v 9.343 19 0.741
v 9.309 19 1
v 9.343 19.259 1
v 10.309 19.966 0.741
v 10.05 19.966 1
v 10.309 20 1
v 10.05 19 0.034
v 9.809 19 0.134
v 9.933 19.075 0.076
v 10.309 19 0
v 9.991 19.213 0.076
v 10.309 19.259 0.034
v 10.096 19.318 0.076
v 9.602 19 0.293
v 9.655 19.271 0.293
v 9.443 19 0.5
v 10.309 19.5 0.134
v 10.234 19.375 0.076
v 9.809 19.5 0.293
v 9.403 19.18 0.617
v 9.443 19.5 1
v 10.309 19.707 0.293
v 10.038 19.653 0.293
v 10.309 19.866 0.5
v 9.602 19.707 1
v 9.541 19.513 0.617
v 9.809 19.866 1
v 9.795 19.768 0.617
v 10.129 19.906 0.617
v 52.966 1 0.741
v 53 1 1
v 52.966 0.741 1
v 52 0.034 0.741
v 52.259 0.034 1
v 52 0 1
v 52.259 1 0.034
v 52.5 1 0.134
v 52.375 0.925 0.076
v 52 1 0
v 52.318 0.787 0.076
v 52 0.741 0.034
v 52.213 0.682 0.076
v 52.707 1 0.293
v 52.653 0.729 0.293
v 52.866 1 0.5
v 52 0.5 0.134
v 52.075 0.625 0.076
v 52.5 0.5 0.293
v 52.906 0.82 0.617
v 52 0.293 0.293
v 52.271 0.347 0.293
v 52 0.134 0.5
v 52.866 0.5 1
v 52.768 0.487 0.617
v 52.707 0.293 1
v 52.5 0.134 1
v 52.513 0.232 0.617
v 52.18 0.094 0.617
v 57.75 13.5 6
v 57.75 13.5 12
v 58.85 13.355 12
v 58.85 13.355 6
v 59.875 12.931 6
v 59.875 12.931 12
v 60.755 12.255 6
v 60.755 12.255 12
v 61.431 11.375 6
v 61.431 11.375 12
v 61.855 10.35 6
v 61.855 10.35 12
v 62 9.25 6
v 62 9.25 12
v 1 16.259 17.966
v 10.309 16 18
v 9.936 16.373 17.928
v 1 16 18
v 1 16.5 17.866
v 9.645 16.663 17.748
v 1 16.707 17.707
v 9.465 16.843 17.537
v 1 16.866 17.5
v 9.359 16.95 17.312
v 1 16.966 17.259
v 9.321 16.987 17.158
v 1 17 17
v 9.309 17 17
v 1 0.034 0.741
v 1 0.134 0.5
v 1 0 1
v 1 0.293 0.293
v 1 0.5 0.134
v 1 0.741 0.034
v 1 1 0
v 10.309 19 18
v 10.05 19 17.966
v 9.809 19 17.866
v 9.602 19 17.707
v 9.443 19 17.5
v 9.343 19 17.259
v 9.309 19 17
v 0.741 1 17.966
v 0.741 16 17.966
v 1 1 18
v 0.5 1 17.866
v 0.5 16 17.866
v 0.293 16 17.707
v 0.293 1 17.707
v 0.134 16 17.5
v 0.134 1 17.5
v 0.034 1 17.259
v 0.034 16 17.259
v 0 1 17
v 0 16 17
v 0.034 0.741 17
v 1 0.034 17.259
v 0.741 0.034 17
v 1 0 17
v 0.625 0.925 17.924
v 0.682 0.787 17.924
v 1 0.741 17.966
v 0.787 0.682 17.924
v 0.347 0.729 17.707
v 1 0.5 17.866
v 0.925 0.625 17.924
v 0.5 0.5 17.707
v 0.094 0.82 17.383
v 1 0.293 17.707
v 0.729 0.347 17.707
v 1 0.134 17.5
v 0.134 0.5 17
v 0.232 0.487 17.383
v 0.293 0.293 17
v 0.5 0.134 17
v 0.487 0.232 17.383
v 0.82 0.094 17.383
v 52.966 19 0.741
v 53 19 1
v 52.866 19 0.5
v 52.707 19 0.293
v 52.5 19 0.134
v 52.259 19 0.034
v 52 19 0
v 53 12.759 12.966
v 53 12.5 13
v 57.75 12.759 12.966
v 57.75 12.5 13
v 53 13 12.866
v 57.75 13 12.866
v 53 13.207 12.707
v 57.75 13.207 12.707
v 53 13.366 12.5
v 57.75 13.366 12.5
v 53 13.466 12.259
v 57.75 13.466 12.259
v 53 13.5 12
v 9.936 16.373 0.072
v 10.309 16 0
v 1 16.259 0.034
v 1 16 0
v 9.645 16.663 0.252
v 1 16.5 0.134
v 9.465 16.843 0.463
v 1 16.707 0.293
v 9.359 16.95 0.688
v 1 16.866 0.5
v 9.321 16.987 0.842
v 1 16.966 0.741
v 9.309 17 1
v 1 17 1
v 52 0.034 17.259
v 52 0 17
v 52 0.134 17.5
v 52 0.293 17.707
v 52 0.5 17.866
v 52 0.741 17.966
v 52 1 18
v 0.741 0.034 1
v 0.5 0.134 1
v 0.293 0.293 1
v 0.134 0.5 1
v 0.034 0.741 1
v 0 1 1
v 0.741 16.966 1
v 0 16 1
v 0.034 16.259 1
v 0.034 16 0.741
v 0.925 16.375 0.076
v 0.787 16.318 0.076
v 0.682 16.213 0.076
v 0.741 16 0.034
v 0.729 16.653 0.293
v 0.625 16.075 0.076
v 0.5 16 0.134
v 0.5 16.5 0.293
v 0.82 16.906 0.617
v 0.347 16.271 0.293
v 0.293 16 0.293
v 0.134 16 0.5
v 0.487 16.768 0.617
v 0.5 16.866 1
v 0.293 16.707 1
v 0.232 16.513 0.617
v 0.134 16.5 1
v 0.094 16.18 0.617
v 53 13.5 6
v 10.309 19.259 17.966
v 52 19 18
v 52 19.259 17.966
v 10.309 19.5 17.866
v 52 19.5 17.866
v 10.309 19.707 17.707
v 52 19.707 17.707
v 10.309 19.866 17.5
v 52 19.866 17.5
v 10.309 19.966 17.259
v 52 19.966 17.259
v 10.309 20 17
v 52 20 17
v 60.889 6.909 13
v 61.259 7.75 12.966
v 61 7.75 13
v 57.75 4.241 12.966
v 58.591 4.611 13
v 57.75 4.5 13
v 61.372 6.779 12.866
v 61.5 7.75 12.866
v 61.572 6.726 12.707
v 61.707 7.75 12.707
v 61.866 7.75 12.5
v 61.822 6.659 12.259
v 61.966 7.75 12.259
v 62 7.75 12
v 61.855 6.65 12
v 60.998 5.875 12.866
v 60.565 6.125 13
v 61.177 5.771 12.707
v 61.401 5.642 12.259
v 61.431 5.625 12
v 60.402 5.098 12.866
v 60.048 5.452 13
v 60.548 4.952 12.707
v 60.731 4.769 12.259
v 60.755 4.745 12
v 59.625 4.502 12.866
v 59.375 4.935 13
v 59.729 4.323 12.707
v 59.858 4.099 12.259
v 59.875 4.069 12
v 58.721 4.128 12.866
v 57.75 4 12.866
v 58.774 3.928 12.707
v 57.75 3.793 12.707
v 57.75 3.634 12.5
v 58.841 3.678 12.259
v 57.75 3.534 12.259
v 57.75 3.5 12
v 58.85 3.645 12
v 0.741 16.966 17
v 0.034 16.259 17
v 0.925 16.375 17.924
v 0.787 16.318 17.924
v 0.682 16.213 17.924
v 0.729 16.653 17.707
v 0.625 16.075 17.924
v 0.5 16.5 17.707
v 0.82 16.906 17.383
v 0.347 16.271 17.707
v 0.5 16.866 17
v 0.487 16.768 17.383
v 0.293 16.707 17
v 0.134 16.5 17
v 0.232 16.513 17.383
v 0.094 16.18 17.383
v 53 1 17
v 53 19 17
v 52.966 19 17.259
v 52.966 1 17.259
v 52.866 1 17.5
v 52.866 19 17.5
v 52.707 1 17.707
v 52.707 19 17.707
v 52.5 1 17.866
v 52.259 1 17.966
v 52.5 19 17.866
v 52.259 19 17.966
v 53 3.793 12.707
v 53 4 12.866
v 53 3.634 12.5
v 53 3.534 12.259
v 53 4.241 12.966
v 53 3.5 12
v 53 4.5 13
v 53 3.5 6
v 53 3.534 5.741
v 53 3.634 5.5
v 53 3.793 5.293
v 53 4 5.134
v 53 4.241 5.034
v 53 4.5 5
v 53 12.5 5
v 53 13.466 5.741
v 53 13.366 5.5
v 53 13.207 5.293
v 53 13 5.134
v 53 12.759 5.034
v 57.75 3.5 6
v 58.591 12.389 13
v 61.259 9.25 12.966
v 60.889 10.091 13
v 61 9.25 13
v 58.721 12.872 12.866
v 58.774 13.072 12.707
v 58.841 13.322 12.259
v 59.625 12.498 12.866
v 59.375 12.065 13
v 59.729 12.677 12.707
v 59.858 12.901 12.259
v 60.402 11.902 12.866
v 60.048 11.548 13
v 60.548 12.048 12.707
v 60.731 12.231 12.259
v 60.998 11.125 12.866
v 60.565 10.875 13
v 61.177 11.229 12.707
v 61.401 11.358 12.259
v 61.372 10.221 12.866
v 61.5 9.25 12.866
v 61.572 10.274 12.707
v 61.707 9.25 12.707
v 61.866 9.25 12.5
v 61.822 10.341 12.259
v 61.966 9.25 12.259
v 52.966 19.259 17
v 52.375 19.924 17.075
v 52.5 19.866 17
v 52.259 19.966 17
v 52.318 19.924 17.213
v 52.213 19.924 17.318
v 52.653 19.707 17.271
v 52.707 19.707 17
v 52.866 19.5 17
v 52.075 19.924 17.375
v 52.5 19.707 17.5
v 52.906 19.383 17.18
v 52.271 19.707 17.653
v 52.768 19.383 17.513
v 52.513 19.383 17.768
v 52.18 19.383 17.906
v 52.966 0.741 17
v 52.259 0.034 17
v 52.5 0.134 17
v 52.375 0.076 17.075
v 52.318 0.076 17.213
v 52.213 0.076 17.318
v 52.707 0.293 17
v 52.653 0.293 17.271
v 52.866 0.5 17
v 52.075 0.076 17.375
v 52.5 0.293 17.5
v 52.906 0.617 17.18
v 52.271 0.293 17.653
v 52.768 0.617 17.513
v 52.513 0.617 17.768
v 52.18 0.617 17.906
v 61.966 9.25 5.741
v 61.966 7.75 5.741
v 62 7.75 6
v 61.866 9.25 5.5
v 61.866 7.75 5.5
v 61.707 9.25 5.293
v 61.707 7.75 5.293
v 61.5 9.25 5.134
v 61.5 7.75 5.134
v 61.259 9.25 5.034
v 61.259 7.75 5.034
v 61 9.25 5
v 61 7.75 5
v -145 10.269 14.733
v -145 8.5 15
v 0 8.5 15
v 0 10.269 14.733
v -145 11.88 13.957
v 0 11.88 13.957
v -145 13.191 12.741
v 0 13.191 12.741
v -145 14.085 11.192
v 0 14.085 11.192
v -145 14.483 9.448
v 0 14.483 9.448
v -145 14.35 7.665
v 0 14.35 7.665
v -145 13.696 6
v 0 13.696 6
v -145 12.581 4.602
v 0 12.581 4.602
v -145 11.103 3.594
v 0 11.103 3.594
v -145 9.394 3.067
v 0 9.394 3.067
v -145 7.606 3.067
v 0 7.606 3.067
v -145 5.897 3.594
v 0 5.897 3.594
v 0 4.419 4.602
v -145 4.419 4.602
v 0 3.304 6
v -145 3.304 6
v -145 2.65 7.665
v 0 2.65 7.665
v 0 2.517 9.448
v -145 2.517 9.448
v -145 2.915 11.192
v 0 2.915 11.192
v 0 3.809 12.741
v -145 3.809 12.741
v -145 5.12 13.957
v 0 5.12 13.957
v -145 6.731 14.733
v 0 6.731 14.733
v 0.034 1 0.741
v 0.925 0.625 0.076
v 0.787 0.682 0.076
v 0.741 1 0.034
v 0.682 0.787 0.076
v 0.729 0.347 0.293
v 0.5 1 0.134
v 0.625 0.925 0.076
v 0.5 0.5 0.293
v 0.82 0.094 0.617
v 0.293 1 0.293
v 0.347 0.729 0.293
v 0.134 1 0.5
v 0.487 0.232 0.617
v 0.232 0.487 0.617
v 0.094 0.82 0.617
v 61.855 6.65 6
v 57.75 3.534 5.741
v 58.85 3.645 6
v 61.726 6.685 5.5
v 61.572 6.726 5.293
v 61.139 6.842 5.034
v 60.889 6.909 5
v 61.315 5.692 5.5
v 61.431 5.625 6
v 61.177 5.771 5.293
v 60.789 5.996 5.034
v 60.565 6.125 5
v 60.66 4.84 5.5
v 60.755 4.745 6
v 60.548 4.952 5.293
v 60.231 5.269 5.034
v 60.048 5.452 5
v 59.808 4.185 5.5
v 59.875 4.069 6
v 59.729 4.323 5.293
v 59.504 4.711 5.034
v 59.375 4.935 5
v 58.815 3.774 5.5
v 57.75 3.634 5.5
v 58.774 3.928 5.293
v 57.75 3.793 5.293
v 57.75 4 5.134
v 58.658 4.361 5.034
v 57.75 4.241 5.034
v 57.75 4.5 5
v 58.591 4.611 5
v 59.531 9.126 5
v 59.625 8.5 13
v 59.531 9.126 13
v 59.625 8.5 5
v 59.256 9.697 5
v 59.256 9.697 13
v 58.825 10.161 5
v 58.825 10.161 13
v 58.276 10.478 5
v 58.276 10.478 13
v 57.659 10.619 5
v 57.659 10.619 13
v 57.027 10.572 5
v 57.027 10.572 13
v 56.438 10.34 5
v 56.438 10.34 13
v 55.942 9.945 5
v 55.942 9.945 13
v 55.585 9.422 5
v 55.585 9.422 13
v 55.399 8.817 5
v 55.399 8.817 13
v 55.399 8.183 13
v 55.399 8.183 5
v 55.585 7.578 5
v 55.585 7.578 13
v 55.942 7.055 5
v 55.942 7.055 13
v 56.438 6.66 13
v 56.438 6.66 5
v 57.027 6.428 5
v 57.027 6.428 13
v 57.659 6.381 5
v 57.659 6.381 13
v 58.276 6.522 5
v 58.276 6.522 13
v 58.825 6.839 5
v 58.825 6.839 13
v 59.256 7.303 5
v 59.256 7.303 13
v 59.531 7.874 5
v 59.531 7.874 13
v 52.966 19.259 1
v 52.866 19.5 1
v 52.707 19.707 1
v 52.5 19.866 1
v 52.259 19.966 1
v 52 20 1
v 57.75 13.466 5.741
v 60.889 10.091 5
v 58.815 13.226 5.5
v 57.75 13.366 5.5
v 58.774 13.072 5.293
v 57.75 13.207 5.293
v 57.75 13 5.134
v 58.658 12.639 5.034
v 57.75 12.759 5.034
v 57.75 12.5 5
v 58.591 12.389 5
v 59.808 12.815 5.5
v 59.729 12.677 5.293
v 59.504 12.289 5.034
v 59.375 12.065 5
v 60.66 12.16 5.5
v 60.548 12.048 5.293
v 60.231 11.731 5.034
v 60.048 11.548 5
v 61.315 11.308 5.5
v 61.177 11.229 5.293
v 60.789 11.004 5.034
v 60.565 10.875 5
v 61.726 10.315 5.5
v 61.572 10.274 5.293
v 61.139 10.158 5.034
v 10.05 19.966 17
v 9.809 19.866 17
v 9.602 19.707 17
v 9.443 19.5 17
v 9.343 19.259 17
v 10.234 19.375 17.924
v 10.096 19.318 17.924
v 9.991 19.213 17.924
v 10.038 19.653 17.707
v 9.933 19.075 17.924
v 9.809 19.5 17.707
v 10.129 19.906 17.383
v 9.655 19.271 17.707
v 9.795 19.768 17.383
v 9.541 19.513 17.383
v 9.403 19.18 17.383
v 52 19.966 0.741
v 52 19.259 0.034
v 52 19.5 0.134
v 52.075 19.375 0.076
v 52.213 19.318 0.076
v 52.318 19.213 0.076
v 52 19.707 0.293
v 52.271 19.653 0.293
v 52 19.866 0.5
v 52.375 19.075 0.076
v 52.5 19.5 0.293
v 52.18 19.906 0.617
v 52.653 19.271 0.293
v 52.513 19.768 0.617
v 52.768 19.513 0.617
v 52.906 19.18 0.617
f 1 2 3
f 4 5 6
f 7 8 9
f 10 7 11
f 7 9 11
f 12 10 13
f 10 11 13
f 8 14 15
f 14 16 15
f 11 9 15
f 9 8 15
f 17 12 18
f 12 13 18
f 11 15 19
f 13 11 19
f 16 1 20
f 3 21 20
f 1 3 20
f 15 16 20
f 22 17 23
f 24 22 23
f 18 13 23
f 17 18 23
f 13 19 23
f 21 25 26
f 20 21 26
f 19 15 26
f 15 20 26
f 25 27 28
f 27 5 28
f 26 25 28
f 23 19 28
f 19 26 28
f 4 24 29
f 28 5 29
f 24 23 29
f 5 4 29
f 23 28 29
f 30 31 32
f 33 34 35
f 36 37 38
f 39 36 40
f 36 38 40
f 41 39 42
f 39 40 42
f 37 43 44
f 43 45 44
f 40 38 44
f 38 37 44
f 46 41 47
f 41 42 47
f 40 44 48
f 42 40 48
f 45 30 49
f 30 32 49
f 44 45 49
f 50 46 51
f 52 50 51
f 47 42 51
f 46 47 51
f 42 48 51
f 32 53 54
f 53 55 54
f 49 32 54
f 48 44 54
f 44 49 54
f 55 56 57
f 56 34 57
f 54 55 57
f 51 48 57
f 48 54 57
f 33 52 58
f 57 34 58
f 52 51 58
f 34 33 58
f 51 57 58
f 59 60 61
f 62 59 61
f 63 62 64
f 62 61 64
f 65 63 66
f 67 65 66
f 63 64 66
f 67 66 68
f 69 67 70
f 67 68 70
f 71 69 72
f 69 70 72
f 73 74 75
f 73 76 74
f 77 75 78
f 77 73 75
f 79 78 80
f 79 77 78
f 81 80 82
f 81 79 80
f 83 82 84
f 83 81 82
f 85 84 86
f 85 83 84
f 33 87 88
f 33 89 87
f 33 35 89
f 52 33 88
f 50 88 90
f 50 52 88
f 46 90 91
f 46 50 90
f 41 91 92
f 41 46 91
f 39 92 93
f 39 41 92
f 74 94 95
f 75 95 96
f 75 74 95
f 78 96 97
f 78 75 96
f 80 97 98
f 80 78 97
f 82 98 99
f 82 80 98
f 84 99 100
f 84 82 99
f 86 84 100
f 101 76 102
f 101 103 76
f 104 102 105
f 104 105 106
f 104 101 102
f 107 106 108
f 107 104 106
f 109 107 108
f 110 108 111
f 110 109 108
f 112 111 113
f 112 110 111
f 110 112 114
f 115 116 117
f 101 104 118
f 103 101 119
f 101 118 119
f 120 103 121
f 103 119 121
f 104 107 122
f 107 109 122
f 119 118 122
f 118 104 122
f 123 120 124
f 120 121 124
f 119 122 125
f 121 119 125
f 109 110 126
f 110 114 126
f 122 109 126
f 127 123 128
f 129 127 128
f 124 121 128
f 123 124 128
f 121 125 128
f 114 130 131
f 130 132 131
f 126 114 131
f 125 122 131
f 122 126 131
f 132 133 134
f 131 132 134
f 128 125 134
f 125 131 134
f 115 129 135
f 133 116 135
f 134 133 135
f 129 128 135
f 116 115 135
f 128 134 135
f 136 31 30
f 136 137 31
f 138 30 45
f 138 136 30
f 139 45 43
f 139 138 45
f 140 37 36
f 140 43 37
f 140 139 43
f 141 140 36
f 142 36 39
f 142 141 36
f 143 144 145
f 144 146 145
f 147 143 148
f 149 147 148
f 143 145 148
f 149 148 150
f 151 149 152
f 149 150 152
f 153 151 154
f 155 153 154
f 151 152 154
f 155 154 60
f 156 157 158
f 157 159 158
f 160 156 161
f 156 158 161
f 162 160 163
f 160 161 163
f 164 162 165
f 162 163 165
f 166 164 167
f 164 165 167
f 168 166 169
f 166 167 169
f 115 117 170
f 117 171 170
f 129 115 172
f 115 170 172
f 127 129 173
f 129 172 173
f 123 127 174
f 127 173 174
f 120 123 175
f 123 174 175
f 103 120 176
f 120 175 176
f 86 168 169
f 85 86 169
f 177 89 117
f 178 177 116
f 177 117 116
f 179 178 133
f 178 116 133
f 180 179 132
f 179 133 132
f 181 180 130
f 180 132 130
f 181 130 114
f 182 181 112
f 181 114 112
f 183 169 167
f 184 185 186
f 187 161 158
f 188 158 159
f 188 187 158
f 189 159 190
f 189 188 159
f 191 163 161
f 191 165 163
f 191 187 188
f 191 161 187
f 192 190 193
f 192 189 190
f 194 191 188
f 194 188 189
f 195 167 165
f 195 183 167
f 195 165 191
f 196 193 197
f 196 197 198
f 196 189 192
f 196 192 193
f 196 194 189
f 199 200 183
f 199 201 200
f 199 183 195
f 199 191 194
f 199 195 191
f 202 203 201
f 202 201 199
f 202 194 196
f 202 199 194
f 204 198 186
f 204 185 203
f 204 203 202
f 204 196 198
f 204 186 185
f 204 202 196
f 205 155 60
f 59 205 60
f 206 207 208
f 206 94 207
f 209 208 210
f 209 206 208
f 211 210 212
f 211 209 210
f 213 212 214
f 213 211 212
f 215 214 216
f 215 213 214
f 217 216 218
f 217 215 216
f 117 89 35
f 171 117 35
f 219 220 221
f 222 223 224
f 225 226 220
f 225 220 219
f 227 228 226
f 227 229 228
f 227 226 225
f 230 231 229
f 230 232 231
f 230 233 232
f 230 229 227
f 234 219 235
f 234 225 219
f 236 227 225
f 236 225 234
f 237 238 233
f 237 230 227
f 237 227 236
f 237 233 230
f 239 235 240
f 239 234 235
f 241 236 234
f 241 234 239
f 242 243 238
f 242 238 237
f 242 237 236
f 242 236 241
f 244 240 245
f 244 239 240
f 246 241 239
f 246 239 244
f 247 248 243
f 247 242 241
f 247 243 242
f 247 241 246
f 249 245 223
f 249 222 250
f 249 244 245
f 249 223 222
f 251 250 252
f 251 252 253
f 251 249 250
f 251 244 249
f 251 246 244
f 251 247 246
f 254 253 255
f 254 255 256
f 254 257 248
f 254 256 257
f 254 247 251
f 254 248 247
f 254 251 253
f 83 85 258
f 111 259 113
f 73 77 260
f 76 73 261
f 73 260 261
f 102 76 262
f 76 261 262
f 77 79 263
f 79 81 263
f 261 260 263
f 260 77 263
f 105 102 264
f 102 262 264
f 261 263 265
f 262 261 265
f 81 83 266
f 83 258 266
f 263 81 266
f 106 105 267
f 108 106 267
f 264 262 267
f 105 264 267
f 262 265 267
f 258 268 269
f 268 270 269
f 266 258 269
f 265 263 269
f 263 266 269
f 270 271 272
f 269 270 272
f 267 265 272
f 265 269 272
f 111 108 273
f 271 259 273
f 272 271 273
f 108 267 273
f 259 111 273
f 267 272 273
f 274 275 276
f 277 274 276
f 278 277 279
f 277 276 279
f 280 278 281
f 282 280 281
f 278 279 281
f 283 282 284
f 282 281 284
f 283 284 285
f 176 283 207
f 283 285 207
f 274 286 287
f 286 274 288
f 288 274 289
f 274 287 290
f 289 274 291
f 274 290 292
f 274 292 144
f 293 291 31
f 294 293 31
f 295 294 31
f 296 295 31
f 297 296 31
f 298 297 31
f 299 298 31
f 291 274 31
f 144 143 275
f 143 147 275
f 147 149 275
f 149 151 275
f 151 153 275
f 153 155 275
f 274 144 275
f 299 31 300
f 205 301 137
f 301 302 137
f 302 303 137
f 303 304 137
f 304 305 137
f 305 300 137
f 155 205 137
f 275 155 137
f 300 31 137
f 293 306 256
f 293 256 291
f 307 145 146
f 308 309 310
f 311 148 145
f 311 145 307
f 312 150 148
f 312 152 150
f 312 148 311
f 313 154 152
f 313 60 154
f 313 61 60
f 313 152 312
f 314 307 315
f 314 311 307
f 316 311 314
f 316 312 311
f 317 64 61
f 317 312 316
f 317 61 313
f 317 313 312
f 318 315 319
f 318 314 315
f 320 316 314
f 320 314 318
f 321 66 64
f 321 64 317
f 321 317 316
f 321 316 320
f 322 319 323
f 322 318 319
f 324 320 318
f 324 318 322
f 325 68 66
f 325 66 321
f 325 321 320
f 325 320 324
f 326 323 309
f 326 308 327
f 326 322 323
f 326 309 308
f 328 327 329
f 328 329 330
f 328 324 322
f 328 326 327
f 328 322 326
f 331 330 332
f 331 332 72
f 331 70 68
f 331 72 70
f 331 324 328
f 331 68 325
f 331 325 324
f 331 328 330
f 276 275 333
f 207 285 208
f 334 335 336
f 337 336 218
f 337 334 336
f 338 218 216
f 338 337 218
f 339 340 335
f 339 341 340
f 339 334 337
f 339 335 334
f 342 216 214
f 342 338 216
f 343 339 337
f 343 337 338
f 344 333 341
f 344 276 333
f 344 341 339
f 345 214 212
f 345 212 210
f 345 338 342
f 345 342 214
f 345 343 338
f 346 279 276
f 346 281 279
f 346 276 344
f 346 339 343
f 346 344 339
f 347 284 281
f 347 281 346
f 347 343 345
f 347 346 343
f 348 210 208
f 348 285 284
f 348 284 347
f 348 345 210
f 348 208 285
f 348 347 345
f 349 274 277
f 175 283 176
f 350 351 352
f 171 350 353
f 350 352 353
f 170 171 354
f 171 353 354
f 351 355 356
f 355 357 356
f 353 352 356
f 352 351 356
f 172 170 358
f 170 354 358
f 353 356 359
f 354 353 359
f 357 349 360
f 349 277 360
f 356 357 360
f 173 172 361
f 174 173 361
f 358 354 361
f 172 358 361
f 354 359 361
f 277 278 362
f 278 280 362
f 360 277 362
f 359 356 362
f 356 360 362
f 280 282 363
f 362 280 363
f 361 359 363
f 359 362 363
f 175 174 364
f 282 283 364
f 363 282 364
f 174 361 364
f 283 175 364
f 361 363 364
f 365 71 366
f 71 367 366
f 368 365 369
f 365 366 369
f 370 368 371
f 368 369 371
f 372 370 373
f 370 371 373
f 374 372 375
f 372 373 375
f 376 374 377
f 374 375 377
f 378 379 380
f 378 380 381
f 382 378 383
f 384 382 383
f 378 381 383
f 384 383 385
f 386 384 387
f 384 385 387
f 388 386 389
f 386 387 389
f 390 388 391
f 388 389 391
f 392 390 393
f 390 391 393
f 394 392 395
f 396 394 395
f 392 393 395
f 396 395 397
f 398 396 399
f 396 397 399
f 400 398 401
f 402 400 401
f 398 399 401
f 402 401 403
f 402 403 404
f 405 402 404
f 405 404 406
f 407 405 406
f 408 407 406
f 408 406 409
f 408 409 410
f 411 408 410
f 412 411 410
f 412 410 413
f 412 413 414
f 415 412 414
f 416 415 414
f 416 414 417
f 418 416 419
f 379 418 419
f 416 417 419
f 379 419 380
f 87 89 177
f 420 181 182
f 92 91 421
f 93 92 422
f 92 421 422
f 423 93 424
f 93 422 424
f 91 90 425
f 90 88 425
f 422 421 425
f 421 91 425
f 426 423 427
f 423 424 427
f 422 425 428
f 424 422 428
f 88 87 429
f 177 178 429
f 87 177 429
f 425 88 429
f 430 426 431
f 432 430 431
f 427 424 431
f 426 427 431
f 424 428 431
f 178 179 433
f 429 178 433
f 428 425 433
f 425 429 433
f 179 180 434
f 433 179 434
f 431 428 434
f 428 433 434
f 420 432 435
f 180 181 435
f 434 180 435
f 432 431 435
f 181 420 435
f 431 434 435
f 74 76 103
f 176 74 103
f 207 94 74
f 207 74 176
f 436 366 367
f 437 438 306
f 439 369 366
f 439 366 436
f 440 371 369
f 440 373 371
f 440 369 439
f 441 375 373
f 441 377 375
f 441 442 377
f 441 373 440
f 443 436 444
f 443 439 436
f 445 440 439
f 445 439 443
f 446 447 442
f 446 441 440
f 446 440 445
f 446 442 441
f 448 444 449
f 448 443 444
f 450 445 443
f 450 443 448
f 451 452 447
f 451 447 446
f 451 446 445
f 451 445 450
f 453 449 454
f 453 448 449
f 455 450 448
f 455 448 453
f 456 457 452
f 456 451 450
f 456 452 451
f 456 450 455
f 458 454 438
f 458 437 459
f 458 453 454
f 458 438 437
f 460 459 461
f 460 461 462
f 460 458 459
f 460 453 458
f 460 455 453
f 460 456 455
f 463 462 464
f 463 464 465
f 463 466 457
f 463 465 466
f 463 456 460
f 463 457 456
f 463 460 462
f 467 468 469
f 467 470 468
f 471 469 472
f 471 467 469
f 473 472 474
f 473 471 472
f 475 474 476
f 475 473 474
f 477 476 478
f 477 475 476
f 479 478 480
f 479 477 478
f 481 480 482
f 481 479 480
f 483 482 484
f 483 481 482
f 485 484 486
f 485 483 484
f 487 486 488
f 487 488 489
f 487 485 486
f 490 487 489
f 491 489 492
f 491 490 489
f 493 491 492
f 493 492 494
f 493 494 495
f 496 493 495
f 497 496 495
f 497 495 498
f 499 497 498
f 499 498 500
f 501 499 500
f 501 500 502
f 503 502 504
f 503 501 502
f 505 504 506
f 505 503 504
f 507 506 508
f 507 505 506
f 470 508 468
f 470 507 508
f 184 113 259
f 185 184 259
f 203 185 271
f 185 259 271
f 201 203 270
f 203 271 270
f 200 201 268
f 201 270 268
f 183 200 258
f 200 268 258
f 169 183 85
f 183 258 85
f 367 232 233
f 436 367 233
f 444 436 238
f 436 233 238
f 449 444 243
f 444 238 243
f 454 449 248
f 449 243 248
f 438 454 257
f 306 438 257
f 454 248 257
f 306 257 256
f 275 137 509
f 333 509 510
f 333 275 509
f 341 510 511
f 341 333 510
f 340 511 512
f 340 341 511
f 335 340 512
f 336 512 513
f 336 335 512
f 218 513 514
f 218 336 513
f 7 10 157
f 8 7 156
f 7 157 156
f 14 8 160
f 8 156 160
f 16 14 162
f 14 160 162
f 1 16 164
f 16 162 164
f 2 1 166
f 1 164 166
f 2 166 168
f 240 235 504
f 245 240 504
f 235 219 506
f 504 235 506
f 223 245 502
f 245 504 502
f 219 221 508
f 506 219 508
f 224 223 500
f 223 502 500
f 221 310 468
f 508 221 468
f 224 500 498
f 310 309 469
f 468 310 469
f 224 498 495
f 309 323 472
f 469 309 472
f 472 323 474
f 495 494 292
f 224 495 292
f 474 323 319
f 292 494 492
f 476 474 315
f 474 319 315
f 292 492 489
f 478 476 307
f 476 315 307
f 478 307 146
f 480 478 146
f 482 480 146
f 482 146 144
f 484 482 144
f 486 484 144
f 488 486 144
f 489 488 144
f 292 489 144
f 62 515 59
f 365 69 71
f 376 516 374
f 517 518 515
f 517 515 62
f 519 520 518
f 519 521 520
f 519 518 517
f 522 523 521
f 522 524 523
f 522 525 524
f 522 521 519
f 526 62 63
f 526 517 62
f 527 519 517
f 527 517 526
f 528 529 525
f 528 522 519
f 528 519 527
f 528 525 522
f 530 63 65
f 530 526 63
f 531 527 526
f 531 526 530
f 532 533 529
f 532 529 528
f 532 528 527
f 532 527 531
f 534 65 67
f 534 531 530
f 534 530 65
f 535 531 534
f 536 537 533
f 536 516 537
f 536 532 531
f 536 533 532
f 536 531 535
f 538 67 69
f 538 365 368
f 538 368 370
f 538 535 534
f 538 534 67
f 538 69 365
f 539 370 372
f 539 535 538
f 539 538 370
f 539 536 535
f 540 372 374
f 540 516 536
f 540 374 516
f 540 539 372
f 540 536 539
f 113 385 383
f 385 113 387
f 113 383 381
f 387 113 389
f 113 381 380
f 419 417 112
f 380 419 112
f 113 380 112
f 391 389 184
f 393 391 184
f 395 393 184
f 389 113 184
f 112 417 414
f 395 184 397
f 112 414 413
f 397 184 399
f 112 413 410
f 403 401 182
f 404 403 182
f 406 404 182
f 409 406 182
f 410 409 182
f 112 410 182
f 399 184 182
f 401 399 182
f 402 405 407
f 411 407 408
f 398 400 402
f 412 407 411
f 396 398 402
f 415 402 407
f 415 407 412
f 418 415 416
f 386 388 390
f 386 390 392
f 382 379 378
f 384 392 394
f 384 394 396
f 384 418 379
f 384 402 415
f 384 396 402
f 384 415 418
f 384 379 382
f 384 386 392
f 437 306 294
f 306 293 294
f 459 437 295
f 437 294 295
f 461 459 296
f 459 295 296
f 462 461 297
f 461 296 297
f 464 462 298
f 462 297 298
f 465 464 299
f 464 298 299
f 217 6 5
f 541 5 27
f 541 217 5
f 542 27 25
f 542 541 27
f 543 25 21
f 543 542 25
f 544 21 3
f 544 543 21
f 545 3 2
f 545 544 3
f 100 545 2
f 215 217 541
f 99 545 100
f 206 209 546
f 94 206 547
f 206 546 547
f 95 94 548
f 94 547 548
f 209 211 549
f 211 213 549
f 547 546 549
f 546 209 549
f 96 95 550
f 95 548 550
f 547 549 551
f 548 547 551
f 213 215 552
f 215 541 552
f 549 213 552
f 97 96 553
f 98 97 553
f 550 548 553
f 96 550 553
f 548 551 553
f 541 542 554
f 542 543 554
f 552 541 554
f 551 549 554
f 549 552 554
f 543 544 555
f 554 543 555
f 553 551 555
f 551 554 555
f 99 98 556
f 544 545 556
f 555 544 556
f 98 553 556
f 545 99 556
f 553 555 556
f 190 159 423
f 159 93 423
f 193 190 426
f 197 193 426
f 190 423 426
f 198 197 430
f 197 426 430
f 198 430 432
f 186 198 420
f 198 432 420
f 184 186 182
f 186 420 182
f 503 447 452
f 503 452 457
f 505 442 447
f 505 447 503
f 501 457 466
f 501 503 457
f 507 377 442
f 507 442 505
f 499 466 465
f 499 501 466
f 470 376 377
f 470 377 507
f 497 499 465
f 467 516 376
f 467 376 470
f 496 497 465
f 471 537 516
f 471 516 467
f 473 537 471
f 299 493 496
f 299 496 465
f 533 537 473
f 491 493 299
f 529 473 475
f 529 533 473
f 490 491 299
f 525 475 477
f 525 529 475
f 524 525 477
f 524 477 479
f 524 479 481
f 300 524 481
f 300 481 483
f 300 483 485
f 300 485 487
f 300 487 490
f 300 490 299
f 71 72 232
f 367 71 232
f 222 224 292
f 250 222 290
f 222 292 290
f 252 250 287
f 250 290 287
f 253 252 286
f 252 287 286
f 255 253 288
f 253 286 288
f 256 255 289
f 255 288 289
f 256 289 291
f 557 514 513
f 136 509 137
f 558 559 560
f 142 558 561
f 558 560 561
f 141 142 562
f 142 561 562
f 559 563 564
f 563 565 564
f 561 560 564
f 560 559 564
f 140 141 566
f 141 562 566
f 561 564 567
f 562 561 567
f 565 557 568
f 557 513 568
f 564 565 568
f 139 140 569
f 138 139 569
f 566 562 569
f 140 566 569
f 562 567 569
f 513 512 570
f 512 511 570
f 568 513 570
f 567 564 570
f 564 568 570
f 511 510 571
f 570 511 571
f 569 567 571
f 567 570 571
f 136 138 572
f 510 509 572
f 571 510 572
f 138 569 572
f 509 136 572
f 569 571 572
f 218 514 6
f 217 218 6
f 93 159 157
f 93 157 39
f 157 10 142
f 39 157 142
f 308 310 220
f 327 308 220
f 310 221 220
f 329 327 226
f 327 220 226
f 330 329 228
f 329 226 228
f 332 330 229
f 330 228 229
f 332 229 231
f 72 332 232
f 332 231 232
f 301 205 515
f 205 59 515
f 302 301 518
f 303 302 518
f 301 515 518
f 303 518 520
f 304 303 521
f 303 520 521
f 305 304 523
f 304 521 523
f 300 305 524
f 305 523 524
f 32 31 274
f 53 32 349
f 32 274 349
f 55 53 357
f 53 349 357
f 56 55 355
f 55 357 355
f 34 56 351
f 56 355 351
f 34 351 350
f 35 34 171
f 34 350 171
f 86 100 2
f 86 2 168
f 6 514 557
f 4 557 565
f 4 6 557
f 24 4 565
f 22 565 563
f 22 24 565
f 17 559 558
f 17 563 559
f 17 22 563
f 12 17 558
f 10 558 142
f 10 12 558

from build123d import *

# Parameters (mm, degrees)
BASE_DEPTH       = 18
MOUNT_DEPTH      = 4
MOUNT_DEPTH_BACK = 4
SKETCH2_R        = 2.125
SKETCH3_R        = 6
TUBE_DEPTH       = 145
FILLET1_R        = 1


with BuildPart() as part:
    # Sketch1 → Base (new body)
    with BuildSketch(Plane.XY):
        Polygon((0, 0), (53, 0), (53, 20), (9.30875576, 20), (9.30875576, 17), (0, 17), align=None)
    extrude(amount=BASE_DEPTH)

    # Sketch2 → Mount (add, two sides: drawn at the far end of the back side and taken through both)
    with BuildSketch(Plane.XY.offset(9).offset(-MOUNT_DEPTH_BACK)):
        with BuildLine():
            Line((53, 13.5), (57.75, 13.5))
            ThreePointArc((57.75, 13.5), (60.75520382, 12.25520382), (62, 9.25))
            Line((62, 9.25), (62, 7.75))
            ThreePointArc((62, 7.75), (60.75520382, 4.74479618), (57.75, 3.5))
            Line((57.75, 3.5), (53, 3.5))
            Line((53, 3.5), (53, 13.5))
        make_face()
        with Locations((57.5, 8.5)):
            Circle(SKETCH2_R, mode=Mode.SUBTRACT)
    extrude(amount=MOUNT_DEPTH + MOUNT_DEPTH_BACK)

    # Sketch3 → Tube (add)
    with BuildSketch(Plane.ZY):
        with Locations((9, 8.5)):
            Circle(SKETCH3_R)
    extrude(amount=TUBE_DEPTH)

    # Fillet1
    fillet1_edges = [part.edges().sort_by_distance(p)[0] for p in [
        (55.375, 3.5, 5),
        (60.75520382, 4.74479618, 5),
        (62, 8.5, 5),
        (55.375, 13.5, 5),
        (55.375, 3.5, 13),
        (60.75520382, 4.74479618, 13),
        (62, 8.5, 13),
        (55.375, 13.5, 13),
        (60.75520382, 12.25520382, 5),
        (60.75520382, 12.25520382, 13),
        (0, 17, 9),
        (0, 0, 9),
        (53, 20, 9),
        (9.30875576, 20, 9),
        (26.5, 0, 0),
        (53, 10, 0),
        (31.15437788, 20, 0),
        (9.30875576, 18.5, 0),
        (4.65437788, 17, 0),
        (0, 8.5, 0),
        (4.65437788, 17, 18),
        (9.30875576, 18.5, 18),
        (31.15437788, 20, 18),
        (53, 10, 18),
        (26.5, 0, 18),
        (0, 8.5, 18),
        (53, 0, 9),
    ]]
    fillet(fillet1_edges, radius=FILLET1_R)


solid = part.part
